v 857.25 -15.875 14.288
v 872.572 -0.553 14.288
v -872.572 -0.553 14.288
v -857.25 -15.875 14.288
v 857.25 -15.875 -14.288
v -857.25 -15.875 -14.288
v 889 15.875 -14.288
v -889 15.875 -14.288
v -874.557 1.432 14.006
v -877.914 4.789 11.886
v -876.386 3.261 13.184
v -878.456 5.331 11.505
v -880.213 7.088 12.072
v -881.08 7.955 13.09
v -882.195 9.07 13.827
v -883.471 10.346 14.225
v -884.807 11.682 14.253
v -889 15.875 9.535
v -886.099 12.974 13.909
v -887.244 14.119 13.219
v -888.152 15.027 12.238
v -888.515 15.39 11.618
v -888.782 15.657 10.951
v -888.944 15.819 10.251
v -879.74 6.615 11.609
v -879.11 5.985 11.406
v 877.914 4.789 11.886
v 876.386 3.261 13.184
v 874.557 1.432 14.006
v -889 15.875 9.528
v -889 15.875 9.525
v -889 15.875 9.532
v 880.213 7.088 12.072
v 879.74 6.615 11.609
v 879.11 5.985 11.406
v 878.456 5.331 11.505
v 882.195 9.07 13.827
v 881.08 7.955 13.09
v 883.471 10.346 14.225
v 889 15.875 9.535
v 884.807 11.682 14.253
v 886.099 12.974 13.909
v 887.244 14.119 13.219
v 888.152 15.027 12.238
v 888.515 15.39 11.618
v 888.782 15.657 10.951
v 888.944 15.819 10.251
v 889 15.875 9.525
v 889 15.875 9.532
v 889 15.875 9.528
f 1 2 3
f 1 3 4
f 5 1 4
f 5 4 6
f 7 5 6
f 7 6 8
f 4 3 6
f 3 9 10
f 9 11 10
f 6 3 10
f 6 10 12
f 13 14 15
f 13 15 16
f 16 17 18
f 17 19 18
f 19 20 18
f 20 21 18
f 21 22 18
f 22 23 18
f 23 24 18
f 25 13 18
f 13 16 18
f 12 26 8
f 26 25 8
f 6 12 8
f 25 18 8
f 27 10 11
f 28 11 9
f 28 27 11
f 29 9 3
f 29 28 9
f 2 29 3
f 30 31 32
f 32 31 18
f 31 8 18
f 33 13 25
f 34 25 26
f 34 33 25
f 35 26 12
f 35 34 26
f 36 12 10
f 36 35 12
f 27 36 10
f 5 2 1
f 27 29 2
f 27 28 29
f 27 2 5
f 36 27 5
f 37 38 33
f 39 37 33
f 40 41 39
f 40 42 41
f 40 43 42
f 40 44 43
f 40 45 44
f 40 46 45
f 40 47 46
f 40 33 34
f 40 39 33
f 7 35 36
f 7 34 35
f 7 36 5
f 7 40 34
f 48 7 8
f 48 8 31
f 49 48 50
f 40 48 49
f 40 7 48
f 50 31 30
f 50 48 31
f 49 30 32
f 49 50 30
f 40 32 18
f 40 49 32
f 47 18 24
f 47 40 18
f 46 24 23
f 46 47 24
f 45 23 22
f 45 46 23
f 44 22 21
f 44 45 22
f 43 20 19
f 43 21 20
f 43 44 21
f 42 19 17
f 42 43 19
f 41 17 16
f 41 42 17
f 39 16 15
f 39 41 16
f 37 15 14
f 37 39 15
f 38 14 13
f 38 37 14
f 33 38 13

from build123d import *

# Parameters (mm, degrees)
F1_DEPTH = 889
F2_SIZE  = 31.74999


# Not quite as in the source:
# - a fillet or chamfer is up to 0.001 mm smaller than in the source, because OpenCascade refuses the exact size


with BuildPart() as f1:
    # F0 (on Right) → F1 (new body, symmetric)
    with BuildSketch(Plane.YZ):
        with BuildLine():
            Line((-15.875, -14.2875), (15.875, -14.2875))
            Line((15.875, -14.2875), (15.875, 9.525))
            ThreePointArc((15.875, 9.525), (12.4385421004, 14.0991686237), (7.08843051, 12.07220847))
            ThreePointArc((7.08843051, 12.07220847), (5.9853917743, 11.4055483551), (4.789455264, 11.886033552))
            ThreePointArc((4.789455264, 11.886033552), (2.3755826554, 13.6595328458), (-0.5531949, 14.2875))
            Line((-0.5531949, 14.2875), (-15.875, 14.2875))
            Line((-15.875, 14.2875), (-15.875, -14.2875))
        make_face()
    extrude(amount=F1_DEPTH, both=True)

    # F2 (size 31.75 in the source; OpenCascade refuses exactly that, so slightly less here)
    f2_edges = [f1.edges().sort_by_distance(p)[0] for p in [
        (-889, -15.875, 0),
        (889, -15.875, 0),
    ]]
    chamfer(f2_edges, length=F2_SIZE)


solid = f1.part
